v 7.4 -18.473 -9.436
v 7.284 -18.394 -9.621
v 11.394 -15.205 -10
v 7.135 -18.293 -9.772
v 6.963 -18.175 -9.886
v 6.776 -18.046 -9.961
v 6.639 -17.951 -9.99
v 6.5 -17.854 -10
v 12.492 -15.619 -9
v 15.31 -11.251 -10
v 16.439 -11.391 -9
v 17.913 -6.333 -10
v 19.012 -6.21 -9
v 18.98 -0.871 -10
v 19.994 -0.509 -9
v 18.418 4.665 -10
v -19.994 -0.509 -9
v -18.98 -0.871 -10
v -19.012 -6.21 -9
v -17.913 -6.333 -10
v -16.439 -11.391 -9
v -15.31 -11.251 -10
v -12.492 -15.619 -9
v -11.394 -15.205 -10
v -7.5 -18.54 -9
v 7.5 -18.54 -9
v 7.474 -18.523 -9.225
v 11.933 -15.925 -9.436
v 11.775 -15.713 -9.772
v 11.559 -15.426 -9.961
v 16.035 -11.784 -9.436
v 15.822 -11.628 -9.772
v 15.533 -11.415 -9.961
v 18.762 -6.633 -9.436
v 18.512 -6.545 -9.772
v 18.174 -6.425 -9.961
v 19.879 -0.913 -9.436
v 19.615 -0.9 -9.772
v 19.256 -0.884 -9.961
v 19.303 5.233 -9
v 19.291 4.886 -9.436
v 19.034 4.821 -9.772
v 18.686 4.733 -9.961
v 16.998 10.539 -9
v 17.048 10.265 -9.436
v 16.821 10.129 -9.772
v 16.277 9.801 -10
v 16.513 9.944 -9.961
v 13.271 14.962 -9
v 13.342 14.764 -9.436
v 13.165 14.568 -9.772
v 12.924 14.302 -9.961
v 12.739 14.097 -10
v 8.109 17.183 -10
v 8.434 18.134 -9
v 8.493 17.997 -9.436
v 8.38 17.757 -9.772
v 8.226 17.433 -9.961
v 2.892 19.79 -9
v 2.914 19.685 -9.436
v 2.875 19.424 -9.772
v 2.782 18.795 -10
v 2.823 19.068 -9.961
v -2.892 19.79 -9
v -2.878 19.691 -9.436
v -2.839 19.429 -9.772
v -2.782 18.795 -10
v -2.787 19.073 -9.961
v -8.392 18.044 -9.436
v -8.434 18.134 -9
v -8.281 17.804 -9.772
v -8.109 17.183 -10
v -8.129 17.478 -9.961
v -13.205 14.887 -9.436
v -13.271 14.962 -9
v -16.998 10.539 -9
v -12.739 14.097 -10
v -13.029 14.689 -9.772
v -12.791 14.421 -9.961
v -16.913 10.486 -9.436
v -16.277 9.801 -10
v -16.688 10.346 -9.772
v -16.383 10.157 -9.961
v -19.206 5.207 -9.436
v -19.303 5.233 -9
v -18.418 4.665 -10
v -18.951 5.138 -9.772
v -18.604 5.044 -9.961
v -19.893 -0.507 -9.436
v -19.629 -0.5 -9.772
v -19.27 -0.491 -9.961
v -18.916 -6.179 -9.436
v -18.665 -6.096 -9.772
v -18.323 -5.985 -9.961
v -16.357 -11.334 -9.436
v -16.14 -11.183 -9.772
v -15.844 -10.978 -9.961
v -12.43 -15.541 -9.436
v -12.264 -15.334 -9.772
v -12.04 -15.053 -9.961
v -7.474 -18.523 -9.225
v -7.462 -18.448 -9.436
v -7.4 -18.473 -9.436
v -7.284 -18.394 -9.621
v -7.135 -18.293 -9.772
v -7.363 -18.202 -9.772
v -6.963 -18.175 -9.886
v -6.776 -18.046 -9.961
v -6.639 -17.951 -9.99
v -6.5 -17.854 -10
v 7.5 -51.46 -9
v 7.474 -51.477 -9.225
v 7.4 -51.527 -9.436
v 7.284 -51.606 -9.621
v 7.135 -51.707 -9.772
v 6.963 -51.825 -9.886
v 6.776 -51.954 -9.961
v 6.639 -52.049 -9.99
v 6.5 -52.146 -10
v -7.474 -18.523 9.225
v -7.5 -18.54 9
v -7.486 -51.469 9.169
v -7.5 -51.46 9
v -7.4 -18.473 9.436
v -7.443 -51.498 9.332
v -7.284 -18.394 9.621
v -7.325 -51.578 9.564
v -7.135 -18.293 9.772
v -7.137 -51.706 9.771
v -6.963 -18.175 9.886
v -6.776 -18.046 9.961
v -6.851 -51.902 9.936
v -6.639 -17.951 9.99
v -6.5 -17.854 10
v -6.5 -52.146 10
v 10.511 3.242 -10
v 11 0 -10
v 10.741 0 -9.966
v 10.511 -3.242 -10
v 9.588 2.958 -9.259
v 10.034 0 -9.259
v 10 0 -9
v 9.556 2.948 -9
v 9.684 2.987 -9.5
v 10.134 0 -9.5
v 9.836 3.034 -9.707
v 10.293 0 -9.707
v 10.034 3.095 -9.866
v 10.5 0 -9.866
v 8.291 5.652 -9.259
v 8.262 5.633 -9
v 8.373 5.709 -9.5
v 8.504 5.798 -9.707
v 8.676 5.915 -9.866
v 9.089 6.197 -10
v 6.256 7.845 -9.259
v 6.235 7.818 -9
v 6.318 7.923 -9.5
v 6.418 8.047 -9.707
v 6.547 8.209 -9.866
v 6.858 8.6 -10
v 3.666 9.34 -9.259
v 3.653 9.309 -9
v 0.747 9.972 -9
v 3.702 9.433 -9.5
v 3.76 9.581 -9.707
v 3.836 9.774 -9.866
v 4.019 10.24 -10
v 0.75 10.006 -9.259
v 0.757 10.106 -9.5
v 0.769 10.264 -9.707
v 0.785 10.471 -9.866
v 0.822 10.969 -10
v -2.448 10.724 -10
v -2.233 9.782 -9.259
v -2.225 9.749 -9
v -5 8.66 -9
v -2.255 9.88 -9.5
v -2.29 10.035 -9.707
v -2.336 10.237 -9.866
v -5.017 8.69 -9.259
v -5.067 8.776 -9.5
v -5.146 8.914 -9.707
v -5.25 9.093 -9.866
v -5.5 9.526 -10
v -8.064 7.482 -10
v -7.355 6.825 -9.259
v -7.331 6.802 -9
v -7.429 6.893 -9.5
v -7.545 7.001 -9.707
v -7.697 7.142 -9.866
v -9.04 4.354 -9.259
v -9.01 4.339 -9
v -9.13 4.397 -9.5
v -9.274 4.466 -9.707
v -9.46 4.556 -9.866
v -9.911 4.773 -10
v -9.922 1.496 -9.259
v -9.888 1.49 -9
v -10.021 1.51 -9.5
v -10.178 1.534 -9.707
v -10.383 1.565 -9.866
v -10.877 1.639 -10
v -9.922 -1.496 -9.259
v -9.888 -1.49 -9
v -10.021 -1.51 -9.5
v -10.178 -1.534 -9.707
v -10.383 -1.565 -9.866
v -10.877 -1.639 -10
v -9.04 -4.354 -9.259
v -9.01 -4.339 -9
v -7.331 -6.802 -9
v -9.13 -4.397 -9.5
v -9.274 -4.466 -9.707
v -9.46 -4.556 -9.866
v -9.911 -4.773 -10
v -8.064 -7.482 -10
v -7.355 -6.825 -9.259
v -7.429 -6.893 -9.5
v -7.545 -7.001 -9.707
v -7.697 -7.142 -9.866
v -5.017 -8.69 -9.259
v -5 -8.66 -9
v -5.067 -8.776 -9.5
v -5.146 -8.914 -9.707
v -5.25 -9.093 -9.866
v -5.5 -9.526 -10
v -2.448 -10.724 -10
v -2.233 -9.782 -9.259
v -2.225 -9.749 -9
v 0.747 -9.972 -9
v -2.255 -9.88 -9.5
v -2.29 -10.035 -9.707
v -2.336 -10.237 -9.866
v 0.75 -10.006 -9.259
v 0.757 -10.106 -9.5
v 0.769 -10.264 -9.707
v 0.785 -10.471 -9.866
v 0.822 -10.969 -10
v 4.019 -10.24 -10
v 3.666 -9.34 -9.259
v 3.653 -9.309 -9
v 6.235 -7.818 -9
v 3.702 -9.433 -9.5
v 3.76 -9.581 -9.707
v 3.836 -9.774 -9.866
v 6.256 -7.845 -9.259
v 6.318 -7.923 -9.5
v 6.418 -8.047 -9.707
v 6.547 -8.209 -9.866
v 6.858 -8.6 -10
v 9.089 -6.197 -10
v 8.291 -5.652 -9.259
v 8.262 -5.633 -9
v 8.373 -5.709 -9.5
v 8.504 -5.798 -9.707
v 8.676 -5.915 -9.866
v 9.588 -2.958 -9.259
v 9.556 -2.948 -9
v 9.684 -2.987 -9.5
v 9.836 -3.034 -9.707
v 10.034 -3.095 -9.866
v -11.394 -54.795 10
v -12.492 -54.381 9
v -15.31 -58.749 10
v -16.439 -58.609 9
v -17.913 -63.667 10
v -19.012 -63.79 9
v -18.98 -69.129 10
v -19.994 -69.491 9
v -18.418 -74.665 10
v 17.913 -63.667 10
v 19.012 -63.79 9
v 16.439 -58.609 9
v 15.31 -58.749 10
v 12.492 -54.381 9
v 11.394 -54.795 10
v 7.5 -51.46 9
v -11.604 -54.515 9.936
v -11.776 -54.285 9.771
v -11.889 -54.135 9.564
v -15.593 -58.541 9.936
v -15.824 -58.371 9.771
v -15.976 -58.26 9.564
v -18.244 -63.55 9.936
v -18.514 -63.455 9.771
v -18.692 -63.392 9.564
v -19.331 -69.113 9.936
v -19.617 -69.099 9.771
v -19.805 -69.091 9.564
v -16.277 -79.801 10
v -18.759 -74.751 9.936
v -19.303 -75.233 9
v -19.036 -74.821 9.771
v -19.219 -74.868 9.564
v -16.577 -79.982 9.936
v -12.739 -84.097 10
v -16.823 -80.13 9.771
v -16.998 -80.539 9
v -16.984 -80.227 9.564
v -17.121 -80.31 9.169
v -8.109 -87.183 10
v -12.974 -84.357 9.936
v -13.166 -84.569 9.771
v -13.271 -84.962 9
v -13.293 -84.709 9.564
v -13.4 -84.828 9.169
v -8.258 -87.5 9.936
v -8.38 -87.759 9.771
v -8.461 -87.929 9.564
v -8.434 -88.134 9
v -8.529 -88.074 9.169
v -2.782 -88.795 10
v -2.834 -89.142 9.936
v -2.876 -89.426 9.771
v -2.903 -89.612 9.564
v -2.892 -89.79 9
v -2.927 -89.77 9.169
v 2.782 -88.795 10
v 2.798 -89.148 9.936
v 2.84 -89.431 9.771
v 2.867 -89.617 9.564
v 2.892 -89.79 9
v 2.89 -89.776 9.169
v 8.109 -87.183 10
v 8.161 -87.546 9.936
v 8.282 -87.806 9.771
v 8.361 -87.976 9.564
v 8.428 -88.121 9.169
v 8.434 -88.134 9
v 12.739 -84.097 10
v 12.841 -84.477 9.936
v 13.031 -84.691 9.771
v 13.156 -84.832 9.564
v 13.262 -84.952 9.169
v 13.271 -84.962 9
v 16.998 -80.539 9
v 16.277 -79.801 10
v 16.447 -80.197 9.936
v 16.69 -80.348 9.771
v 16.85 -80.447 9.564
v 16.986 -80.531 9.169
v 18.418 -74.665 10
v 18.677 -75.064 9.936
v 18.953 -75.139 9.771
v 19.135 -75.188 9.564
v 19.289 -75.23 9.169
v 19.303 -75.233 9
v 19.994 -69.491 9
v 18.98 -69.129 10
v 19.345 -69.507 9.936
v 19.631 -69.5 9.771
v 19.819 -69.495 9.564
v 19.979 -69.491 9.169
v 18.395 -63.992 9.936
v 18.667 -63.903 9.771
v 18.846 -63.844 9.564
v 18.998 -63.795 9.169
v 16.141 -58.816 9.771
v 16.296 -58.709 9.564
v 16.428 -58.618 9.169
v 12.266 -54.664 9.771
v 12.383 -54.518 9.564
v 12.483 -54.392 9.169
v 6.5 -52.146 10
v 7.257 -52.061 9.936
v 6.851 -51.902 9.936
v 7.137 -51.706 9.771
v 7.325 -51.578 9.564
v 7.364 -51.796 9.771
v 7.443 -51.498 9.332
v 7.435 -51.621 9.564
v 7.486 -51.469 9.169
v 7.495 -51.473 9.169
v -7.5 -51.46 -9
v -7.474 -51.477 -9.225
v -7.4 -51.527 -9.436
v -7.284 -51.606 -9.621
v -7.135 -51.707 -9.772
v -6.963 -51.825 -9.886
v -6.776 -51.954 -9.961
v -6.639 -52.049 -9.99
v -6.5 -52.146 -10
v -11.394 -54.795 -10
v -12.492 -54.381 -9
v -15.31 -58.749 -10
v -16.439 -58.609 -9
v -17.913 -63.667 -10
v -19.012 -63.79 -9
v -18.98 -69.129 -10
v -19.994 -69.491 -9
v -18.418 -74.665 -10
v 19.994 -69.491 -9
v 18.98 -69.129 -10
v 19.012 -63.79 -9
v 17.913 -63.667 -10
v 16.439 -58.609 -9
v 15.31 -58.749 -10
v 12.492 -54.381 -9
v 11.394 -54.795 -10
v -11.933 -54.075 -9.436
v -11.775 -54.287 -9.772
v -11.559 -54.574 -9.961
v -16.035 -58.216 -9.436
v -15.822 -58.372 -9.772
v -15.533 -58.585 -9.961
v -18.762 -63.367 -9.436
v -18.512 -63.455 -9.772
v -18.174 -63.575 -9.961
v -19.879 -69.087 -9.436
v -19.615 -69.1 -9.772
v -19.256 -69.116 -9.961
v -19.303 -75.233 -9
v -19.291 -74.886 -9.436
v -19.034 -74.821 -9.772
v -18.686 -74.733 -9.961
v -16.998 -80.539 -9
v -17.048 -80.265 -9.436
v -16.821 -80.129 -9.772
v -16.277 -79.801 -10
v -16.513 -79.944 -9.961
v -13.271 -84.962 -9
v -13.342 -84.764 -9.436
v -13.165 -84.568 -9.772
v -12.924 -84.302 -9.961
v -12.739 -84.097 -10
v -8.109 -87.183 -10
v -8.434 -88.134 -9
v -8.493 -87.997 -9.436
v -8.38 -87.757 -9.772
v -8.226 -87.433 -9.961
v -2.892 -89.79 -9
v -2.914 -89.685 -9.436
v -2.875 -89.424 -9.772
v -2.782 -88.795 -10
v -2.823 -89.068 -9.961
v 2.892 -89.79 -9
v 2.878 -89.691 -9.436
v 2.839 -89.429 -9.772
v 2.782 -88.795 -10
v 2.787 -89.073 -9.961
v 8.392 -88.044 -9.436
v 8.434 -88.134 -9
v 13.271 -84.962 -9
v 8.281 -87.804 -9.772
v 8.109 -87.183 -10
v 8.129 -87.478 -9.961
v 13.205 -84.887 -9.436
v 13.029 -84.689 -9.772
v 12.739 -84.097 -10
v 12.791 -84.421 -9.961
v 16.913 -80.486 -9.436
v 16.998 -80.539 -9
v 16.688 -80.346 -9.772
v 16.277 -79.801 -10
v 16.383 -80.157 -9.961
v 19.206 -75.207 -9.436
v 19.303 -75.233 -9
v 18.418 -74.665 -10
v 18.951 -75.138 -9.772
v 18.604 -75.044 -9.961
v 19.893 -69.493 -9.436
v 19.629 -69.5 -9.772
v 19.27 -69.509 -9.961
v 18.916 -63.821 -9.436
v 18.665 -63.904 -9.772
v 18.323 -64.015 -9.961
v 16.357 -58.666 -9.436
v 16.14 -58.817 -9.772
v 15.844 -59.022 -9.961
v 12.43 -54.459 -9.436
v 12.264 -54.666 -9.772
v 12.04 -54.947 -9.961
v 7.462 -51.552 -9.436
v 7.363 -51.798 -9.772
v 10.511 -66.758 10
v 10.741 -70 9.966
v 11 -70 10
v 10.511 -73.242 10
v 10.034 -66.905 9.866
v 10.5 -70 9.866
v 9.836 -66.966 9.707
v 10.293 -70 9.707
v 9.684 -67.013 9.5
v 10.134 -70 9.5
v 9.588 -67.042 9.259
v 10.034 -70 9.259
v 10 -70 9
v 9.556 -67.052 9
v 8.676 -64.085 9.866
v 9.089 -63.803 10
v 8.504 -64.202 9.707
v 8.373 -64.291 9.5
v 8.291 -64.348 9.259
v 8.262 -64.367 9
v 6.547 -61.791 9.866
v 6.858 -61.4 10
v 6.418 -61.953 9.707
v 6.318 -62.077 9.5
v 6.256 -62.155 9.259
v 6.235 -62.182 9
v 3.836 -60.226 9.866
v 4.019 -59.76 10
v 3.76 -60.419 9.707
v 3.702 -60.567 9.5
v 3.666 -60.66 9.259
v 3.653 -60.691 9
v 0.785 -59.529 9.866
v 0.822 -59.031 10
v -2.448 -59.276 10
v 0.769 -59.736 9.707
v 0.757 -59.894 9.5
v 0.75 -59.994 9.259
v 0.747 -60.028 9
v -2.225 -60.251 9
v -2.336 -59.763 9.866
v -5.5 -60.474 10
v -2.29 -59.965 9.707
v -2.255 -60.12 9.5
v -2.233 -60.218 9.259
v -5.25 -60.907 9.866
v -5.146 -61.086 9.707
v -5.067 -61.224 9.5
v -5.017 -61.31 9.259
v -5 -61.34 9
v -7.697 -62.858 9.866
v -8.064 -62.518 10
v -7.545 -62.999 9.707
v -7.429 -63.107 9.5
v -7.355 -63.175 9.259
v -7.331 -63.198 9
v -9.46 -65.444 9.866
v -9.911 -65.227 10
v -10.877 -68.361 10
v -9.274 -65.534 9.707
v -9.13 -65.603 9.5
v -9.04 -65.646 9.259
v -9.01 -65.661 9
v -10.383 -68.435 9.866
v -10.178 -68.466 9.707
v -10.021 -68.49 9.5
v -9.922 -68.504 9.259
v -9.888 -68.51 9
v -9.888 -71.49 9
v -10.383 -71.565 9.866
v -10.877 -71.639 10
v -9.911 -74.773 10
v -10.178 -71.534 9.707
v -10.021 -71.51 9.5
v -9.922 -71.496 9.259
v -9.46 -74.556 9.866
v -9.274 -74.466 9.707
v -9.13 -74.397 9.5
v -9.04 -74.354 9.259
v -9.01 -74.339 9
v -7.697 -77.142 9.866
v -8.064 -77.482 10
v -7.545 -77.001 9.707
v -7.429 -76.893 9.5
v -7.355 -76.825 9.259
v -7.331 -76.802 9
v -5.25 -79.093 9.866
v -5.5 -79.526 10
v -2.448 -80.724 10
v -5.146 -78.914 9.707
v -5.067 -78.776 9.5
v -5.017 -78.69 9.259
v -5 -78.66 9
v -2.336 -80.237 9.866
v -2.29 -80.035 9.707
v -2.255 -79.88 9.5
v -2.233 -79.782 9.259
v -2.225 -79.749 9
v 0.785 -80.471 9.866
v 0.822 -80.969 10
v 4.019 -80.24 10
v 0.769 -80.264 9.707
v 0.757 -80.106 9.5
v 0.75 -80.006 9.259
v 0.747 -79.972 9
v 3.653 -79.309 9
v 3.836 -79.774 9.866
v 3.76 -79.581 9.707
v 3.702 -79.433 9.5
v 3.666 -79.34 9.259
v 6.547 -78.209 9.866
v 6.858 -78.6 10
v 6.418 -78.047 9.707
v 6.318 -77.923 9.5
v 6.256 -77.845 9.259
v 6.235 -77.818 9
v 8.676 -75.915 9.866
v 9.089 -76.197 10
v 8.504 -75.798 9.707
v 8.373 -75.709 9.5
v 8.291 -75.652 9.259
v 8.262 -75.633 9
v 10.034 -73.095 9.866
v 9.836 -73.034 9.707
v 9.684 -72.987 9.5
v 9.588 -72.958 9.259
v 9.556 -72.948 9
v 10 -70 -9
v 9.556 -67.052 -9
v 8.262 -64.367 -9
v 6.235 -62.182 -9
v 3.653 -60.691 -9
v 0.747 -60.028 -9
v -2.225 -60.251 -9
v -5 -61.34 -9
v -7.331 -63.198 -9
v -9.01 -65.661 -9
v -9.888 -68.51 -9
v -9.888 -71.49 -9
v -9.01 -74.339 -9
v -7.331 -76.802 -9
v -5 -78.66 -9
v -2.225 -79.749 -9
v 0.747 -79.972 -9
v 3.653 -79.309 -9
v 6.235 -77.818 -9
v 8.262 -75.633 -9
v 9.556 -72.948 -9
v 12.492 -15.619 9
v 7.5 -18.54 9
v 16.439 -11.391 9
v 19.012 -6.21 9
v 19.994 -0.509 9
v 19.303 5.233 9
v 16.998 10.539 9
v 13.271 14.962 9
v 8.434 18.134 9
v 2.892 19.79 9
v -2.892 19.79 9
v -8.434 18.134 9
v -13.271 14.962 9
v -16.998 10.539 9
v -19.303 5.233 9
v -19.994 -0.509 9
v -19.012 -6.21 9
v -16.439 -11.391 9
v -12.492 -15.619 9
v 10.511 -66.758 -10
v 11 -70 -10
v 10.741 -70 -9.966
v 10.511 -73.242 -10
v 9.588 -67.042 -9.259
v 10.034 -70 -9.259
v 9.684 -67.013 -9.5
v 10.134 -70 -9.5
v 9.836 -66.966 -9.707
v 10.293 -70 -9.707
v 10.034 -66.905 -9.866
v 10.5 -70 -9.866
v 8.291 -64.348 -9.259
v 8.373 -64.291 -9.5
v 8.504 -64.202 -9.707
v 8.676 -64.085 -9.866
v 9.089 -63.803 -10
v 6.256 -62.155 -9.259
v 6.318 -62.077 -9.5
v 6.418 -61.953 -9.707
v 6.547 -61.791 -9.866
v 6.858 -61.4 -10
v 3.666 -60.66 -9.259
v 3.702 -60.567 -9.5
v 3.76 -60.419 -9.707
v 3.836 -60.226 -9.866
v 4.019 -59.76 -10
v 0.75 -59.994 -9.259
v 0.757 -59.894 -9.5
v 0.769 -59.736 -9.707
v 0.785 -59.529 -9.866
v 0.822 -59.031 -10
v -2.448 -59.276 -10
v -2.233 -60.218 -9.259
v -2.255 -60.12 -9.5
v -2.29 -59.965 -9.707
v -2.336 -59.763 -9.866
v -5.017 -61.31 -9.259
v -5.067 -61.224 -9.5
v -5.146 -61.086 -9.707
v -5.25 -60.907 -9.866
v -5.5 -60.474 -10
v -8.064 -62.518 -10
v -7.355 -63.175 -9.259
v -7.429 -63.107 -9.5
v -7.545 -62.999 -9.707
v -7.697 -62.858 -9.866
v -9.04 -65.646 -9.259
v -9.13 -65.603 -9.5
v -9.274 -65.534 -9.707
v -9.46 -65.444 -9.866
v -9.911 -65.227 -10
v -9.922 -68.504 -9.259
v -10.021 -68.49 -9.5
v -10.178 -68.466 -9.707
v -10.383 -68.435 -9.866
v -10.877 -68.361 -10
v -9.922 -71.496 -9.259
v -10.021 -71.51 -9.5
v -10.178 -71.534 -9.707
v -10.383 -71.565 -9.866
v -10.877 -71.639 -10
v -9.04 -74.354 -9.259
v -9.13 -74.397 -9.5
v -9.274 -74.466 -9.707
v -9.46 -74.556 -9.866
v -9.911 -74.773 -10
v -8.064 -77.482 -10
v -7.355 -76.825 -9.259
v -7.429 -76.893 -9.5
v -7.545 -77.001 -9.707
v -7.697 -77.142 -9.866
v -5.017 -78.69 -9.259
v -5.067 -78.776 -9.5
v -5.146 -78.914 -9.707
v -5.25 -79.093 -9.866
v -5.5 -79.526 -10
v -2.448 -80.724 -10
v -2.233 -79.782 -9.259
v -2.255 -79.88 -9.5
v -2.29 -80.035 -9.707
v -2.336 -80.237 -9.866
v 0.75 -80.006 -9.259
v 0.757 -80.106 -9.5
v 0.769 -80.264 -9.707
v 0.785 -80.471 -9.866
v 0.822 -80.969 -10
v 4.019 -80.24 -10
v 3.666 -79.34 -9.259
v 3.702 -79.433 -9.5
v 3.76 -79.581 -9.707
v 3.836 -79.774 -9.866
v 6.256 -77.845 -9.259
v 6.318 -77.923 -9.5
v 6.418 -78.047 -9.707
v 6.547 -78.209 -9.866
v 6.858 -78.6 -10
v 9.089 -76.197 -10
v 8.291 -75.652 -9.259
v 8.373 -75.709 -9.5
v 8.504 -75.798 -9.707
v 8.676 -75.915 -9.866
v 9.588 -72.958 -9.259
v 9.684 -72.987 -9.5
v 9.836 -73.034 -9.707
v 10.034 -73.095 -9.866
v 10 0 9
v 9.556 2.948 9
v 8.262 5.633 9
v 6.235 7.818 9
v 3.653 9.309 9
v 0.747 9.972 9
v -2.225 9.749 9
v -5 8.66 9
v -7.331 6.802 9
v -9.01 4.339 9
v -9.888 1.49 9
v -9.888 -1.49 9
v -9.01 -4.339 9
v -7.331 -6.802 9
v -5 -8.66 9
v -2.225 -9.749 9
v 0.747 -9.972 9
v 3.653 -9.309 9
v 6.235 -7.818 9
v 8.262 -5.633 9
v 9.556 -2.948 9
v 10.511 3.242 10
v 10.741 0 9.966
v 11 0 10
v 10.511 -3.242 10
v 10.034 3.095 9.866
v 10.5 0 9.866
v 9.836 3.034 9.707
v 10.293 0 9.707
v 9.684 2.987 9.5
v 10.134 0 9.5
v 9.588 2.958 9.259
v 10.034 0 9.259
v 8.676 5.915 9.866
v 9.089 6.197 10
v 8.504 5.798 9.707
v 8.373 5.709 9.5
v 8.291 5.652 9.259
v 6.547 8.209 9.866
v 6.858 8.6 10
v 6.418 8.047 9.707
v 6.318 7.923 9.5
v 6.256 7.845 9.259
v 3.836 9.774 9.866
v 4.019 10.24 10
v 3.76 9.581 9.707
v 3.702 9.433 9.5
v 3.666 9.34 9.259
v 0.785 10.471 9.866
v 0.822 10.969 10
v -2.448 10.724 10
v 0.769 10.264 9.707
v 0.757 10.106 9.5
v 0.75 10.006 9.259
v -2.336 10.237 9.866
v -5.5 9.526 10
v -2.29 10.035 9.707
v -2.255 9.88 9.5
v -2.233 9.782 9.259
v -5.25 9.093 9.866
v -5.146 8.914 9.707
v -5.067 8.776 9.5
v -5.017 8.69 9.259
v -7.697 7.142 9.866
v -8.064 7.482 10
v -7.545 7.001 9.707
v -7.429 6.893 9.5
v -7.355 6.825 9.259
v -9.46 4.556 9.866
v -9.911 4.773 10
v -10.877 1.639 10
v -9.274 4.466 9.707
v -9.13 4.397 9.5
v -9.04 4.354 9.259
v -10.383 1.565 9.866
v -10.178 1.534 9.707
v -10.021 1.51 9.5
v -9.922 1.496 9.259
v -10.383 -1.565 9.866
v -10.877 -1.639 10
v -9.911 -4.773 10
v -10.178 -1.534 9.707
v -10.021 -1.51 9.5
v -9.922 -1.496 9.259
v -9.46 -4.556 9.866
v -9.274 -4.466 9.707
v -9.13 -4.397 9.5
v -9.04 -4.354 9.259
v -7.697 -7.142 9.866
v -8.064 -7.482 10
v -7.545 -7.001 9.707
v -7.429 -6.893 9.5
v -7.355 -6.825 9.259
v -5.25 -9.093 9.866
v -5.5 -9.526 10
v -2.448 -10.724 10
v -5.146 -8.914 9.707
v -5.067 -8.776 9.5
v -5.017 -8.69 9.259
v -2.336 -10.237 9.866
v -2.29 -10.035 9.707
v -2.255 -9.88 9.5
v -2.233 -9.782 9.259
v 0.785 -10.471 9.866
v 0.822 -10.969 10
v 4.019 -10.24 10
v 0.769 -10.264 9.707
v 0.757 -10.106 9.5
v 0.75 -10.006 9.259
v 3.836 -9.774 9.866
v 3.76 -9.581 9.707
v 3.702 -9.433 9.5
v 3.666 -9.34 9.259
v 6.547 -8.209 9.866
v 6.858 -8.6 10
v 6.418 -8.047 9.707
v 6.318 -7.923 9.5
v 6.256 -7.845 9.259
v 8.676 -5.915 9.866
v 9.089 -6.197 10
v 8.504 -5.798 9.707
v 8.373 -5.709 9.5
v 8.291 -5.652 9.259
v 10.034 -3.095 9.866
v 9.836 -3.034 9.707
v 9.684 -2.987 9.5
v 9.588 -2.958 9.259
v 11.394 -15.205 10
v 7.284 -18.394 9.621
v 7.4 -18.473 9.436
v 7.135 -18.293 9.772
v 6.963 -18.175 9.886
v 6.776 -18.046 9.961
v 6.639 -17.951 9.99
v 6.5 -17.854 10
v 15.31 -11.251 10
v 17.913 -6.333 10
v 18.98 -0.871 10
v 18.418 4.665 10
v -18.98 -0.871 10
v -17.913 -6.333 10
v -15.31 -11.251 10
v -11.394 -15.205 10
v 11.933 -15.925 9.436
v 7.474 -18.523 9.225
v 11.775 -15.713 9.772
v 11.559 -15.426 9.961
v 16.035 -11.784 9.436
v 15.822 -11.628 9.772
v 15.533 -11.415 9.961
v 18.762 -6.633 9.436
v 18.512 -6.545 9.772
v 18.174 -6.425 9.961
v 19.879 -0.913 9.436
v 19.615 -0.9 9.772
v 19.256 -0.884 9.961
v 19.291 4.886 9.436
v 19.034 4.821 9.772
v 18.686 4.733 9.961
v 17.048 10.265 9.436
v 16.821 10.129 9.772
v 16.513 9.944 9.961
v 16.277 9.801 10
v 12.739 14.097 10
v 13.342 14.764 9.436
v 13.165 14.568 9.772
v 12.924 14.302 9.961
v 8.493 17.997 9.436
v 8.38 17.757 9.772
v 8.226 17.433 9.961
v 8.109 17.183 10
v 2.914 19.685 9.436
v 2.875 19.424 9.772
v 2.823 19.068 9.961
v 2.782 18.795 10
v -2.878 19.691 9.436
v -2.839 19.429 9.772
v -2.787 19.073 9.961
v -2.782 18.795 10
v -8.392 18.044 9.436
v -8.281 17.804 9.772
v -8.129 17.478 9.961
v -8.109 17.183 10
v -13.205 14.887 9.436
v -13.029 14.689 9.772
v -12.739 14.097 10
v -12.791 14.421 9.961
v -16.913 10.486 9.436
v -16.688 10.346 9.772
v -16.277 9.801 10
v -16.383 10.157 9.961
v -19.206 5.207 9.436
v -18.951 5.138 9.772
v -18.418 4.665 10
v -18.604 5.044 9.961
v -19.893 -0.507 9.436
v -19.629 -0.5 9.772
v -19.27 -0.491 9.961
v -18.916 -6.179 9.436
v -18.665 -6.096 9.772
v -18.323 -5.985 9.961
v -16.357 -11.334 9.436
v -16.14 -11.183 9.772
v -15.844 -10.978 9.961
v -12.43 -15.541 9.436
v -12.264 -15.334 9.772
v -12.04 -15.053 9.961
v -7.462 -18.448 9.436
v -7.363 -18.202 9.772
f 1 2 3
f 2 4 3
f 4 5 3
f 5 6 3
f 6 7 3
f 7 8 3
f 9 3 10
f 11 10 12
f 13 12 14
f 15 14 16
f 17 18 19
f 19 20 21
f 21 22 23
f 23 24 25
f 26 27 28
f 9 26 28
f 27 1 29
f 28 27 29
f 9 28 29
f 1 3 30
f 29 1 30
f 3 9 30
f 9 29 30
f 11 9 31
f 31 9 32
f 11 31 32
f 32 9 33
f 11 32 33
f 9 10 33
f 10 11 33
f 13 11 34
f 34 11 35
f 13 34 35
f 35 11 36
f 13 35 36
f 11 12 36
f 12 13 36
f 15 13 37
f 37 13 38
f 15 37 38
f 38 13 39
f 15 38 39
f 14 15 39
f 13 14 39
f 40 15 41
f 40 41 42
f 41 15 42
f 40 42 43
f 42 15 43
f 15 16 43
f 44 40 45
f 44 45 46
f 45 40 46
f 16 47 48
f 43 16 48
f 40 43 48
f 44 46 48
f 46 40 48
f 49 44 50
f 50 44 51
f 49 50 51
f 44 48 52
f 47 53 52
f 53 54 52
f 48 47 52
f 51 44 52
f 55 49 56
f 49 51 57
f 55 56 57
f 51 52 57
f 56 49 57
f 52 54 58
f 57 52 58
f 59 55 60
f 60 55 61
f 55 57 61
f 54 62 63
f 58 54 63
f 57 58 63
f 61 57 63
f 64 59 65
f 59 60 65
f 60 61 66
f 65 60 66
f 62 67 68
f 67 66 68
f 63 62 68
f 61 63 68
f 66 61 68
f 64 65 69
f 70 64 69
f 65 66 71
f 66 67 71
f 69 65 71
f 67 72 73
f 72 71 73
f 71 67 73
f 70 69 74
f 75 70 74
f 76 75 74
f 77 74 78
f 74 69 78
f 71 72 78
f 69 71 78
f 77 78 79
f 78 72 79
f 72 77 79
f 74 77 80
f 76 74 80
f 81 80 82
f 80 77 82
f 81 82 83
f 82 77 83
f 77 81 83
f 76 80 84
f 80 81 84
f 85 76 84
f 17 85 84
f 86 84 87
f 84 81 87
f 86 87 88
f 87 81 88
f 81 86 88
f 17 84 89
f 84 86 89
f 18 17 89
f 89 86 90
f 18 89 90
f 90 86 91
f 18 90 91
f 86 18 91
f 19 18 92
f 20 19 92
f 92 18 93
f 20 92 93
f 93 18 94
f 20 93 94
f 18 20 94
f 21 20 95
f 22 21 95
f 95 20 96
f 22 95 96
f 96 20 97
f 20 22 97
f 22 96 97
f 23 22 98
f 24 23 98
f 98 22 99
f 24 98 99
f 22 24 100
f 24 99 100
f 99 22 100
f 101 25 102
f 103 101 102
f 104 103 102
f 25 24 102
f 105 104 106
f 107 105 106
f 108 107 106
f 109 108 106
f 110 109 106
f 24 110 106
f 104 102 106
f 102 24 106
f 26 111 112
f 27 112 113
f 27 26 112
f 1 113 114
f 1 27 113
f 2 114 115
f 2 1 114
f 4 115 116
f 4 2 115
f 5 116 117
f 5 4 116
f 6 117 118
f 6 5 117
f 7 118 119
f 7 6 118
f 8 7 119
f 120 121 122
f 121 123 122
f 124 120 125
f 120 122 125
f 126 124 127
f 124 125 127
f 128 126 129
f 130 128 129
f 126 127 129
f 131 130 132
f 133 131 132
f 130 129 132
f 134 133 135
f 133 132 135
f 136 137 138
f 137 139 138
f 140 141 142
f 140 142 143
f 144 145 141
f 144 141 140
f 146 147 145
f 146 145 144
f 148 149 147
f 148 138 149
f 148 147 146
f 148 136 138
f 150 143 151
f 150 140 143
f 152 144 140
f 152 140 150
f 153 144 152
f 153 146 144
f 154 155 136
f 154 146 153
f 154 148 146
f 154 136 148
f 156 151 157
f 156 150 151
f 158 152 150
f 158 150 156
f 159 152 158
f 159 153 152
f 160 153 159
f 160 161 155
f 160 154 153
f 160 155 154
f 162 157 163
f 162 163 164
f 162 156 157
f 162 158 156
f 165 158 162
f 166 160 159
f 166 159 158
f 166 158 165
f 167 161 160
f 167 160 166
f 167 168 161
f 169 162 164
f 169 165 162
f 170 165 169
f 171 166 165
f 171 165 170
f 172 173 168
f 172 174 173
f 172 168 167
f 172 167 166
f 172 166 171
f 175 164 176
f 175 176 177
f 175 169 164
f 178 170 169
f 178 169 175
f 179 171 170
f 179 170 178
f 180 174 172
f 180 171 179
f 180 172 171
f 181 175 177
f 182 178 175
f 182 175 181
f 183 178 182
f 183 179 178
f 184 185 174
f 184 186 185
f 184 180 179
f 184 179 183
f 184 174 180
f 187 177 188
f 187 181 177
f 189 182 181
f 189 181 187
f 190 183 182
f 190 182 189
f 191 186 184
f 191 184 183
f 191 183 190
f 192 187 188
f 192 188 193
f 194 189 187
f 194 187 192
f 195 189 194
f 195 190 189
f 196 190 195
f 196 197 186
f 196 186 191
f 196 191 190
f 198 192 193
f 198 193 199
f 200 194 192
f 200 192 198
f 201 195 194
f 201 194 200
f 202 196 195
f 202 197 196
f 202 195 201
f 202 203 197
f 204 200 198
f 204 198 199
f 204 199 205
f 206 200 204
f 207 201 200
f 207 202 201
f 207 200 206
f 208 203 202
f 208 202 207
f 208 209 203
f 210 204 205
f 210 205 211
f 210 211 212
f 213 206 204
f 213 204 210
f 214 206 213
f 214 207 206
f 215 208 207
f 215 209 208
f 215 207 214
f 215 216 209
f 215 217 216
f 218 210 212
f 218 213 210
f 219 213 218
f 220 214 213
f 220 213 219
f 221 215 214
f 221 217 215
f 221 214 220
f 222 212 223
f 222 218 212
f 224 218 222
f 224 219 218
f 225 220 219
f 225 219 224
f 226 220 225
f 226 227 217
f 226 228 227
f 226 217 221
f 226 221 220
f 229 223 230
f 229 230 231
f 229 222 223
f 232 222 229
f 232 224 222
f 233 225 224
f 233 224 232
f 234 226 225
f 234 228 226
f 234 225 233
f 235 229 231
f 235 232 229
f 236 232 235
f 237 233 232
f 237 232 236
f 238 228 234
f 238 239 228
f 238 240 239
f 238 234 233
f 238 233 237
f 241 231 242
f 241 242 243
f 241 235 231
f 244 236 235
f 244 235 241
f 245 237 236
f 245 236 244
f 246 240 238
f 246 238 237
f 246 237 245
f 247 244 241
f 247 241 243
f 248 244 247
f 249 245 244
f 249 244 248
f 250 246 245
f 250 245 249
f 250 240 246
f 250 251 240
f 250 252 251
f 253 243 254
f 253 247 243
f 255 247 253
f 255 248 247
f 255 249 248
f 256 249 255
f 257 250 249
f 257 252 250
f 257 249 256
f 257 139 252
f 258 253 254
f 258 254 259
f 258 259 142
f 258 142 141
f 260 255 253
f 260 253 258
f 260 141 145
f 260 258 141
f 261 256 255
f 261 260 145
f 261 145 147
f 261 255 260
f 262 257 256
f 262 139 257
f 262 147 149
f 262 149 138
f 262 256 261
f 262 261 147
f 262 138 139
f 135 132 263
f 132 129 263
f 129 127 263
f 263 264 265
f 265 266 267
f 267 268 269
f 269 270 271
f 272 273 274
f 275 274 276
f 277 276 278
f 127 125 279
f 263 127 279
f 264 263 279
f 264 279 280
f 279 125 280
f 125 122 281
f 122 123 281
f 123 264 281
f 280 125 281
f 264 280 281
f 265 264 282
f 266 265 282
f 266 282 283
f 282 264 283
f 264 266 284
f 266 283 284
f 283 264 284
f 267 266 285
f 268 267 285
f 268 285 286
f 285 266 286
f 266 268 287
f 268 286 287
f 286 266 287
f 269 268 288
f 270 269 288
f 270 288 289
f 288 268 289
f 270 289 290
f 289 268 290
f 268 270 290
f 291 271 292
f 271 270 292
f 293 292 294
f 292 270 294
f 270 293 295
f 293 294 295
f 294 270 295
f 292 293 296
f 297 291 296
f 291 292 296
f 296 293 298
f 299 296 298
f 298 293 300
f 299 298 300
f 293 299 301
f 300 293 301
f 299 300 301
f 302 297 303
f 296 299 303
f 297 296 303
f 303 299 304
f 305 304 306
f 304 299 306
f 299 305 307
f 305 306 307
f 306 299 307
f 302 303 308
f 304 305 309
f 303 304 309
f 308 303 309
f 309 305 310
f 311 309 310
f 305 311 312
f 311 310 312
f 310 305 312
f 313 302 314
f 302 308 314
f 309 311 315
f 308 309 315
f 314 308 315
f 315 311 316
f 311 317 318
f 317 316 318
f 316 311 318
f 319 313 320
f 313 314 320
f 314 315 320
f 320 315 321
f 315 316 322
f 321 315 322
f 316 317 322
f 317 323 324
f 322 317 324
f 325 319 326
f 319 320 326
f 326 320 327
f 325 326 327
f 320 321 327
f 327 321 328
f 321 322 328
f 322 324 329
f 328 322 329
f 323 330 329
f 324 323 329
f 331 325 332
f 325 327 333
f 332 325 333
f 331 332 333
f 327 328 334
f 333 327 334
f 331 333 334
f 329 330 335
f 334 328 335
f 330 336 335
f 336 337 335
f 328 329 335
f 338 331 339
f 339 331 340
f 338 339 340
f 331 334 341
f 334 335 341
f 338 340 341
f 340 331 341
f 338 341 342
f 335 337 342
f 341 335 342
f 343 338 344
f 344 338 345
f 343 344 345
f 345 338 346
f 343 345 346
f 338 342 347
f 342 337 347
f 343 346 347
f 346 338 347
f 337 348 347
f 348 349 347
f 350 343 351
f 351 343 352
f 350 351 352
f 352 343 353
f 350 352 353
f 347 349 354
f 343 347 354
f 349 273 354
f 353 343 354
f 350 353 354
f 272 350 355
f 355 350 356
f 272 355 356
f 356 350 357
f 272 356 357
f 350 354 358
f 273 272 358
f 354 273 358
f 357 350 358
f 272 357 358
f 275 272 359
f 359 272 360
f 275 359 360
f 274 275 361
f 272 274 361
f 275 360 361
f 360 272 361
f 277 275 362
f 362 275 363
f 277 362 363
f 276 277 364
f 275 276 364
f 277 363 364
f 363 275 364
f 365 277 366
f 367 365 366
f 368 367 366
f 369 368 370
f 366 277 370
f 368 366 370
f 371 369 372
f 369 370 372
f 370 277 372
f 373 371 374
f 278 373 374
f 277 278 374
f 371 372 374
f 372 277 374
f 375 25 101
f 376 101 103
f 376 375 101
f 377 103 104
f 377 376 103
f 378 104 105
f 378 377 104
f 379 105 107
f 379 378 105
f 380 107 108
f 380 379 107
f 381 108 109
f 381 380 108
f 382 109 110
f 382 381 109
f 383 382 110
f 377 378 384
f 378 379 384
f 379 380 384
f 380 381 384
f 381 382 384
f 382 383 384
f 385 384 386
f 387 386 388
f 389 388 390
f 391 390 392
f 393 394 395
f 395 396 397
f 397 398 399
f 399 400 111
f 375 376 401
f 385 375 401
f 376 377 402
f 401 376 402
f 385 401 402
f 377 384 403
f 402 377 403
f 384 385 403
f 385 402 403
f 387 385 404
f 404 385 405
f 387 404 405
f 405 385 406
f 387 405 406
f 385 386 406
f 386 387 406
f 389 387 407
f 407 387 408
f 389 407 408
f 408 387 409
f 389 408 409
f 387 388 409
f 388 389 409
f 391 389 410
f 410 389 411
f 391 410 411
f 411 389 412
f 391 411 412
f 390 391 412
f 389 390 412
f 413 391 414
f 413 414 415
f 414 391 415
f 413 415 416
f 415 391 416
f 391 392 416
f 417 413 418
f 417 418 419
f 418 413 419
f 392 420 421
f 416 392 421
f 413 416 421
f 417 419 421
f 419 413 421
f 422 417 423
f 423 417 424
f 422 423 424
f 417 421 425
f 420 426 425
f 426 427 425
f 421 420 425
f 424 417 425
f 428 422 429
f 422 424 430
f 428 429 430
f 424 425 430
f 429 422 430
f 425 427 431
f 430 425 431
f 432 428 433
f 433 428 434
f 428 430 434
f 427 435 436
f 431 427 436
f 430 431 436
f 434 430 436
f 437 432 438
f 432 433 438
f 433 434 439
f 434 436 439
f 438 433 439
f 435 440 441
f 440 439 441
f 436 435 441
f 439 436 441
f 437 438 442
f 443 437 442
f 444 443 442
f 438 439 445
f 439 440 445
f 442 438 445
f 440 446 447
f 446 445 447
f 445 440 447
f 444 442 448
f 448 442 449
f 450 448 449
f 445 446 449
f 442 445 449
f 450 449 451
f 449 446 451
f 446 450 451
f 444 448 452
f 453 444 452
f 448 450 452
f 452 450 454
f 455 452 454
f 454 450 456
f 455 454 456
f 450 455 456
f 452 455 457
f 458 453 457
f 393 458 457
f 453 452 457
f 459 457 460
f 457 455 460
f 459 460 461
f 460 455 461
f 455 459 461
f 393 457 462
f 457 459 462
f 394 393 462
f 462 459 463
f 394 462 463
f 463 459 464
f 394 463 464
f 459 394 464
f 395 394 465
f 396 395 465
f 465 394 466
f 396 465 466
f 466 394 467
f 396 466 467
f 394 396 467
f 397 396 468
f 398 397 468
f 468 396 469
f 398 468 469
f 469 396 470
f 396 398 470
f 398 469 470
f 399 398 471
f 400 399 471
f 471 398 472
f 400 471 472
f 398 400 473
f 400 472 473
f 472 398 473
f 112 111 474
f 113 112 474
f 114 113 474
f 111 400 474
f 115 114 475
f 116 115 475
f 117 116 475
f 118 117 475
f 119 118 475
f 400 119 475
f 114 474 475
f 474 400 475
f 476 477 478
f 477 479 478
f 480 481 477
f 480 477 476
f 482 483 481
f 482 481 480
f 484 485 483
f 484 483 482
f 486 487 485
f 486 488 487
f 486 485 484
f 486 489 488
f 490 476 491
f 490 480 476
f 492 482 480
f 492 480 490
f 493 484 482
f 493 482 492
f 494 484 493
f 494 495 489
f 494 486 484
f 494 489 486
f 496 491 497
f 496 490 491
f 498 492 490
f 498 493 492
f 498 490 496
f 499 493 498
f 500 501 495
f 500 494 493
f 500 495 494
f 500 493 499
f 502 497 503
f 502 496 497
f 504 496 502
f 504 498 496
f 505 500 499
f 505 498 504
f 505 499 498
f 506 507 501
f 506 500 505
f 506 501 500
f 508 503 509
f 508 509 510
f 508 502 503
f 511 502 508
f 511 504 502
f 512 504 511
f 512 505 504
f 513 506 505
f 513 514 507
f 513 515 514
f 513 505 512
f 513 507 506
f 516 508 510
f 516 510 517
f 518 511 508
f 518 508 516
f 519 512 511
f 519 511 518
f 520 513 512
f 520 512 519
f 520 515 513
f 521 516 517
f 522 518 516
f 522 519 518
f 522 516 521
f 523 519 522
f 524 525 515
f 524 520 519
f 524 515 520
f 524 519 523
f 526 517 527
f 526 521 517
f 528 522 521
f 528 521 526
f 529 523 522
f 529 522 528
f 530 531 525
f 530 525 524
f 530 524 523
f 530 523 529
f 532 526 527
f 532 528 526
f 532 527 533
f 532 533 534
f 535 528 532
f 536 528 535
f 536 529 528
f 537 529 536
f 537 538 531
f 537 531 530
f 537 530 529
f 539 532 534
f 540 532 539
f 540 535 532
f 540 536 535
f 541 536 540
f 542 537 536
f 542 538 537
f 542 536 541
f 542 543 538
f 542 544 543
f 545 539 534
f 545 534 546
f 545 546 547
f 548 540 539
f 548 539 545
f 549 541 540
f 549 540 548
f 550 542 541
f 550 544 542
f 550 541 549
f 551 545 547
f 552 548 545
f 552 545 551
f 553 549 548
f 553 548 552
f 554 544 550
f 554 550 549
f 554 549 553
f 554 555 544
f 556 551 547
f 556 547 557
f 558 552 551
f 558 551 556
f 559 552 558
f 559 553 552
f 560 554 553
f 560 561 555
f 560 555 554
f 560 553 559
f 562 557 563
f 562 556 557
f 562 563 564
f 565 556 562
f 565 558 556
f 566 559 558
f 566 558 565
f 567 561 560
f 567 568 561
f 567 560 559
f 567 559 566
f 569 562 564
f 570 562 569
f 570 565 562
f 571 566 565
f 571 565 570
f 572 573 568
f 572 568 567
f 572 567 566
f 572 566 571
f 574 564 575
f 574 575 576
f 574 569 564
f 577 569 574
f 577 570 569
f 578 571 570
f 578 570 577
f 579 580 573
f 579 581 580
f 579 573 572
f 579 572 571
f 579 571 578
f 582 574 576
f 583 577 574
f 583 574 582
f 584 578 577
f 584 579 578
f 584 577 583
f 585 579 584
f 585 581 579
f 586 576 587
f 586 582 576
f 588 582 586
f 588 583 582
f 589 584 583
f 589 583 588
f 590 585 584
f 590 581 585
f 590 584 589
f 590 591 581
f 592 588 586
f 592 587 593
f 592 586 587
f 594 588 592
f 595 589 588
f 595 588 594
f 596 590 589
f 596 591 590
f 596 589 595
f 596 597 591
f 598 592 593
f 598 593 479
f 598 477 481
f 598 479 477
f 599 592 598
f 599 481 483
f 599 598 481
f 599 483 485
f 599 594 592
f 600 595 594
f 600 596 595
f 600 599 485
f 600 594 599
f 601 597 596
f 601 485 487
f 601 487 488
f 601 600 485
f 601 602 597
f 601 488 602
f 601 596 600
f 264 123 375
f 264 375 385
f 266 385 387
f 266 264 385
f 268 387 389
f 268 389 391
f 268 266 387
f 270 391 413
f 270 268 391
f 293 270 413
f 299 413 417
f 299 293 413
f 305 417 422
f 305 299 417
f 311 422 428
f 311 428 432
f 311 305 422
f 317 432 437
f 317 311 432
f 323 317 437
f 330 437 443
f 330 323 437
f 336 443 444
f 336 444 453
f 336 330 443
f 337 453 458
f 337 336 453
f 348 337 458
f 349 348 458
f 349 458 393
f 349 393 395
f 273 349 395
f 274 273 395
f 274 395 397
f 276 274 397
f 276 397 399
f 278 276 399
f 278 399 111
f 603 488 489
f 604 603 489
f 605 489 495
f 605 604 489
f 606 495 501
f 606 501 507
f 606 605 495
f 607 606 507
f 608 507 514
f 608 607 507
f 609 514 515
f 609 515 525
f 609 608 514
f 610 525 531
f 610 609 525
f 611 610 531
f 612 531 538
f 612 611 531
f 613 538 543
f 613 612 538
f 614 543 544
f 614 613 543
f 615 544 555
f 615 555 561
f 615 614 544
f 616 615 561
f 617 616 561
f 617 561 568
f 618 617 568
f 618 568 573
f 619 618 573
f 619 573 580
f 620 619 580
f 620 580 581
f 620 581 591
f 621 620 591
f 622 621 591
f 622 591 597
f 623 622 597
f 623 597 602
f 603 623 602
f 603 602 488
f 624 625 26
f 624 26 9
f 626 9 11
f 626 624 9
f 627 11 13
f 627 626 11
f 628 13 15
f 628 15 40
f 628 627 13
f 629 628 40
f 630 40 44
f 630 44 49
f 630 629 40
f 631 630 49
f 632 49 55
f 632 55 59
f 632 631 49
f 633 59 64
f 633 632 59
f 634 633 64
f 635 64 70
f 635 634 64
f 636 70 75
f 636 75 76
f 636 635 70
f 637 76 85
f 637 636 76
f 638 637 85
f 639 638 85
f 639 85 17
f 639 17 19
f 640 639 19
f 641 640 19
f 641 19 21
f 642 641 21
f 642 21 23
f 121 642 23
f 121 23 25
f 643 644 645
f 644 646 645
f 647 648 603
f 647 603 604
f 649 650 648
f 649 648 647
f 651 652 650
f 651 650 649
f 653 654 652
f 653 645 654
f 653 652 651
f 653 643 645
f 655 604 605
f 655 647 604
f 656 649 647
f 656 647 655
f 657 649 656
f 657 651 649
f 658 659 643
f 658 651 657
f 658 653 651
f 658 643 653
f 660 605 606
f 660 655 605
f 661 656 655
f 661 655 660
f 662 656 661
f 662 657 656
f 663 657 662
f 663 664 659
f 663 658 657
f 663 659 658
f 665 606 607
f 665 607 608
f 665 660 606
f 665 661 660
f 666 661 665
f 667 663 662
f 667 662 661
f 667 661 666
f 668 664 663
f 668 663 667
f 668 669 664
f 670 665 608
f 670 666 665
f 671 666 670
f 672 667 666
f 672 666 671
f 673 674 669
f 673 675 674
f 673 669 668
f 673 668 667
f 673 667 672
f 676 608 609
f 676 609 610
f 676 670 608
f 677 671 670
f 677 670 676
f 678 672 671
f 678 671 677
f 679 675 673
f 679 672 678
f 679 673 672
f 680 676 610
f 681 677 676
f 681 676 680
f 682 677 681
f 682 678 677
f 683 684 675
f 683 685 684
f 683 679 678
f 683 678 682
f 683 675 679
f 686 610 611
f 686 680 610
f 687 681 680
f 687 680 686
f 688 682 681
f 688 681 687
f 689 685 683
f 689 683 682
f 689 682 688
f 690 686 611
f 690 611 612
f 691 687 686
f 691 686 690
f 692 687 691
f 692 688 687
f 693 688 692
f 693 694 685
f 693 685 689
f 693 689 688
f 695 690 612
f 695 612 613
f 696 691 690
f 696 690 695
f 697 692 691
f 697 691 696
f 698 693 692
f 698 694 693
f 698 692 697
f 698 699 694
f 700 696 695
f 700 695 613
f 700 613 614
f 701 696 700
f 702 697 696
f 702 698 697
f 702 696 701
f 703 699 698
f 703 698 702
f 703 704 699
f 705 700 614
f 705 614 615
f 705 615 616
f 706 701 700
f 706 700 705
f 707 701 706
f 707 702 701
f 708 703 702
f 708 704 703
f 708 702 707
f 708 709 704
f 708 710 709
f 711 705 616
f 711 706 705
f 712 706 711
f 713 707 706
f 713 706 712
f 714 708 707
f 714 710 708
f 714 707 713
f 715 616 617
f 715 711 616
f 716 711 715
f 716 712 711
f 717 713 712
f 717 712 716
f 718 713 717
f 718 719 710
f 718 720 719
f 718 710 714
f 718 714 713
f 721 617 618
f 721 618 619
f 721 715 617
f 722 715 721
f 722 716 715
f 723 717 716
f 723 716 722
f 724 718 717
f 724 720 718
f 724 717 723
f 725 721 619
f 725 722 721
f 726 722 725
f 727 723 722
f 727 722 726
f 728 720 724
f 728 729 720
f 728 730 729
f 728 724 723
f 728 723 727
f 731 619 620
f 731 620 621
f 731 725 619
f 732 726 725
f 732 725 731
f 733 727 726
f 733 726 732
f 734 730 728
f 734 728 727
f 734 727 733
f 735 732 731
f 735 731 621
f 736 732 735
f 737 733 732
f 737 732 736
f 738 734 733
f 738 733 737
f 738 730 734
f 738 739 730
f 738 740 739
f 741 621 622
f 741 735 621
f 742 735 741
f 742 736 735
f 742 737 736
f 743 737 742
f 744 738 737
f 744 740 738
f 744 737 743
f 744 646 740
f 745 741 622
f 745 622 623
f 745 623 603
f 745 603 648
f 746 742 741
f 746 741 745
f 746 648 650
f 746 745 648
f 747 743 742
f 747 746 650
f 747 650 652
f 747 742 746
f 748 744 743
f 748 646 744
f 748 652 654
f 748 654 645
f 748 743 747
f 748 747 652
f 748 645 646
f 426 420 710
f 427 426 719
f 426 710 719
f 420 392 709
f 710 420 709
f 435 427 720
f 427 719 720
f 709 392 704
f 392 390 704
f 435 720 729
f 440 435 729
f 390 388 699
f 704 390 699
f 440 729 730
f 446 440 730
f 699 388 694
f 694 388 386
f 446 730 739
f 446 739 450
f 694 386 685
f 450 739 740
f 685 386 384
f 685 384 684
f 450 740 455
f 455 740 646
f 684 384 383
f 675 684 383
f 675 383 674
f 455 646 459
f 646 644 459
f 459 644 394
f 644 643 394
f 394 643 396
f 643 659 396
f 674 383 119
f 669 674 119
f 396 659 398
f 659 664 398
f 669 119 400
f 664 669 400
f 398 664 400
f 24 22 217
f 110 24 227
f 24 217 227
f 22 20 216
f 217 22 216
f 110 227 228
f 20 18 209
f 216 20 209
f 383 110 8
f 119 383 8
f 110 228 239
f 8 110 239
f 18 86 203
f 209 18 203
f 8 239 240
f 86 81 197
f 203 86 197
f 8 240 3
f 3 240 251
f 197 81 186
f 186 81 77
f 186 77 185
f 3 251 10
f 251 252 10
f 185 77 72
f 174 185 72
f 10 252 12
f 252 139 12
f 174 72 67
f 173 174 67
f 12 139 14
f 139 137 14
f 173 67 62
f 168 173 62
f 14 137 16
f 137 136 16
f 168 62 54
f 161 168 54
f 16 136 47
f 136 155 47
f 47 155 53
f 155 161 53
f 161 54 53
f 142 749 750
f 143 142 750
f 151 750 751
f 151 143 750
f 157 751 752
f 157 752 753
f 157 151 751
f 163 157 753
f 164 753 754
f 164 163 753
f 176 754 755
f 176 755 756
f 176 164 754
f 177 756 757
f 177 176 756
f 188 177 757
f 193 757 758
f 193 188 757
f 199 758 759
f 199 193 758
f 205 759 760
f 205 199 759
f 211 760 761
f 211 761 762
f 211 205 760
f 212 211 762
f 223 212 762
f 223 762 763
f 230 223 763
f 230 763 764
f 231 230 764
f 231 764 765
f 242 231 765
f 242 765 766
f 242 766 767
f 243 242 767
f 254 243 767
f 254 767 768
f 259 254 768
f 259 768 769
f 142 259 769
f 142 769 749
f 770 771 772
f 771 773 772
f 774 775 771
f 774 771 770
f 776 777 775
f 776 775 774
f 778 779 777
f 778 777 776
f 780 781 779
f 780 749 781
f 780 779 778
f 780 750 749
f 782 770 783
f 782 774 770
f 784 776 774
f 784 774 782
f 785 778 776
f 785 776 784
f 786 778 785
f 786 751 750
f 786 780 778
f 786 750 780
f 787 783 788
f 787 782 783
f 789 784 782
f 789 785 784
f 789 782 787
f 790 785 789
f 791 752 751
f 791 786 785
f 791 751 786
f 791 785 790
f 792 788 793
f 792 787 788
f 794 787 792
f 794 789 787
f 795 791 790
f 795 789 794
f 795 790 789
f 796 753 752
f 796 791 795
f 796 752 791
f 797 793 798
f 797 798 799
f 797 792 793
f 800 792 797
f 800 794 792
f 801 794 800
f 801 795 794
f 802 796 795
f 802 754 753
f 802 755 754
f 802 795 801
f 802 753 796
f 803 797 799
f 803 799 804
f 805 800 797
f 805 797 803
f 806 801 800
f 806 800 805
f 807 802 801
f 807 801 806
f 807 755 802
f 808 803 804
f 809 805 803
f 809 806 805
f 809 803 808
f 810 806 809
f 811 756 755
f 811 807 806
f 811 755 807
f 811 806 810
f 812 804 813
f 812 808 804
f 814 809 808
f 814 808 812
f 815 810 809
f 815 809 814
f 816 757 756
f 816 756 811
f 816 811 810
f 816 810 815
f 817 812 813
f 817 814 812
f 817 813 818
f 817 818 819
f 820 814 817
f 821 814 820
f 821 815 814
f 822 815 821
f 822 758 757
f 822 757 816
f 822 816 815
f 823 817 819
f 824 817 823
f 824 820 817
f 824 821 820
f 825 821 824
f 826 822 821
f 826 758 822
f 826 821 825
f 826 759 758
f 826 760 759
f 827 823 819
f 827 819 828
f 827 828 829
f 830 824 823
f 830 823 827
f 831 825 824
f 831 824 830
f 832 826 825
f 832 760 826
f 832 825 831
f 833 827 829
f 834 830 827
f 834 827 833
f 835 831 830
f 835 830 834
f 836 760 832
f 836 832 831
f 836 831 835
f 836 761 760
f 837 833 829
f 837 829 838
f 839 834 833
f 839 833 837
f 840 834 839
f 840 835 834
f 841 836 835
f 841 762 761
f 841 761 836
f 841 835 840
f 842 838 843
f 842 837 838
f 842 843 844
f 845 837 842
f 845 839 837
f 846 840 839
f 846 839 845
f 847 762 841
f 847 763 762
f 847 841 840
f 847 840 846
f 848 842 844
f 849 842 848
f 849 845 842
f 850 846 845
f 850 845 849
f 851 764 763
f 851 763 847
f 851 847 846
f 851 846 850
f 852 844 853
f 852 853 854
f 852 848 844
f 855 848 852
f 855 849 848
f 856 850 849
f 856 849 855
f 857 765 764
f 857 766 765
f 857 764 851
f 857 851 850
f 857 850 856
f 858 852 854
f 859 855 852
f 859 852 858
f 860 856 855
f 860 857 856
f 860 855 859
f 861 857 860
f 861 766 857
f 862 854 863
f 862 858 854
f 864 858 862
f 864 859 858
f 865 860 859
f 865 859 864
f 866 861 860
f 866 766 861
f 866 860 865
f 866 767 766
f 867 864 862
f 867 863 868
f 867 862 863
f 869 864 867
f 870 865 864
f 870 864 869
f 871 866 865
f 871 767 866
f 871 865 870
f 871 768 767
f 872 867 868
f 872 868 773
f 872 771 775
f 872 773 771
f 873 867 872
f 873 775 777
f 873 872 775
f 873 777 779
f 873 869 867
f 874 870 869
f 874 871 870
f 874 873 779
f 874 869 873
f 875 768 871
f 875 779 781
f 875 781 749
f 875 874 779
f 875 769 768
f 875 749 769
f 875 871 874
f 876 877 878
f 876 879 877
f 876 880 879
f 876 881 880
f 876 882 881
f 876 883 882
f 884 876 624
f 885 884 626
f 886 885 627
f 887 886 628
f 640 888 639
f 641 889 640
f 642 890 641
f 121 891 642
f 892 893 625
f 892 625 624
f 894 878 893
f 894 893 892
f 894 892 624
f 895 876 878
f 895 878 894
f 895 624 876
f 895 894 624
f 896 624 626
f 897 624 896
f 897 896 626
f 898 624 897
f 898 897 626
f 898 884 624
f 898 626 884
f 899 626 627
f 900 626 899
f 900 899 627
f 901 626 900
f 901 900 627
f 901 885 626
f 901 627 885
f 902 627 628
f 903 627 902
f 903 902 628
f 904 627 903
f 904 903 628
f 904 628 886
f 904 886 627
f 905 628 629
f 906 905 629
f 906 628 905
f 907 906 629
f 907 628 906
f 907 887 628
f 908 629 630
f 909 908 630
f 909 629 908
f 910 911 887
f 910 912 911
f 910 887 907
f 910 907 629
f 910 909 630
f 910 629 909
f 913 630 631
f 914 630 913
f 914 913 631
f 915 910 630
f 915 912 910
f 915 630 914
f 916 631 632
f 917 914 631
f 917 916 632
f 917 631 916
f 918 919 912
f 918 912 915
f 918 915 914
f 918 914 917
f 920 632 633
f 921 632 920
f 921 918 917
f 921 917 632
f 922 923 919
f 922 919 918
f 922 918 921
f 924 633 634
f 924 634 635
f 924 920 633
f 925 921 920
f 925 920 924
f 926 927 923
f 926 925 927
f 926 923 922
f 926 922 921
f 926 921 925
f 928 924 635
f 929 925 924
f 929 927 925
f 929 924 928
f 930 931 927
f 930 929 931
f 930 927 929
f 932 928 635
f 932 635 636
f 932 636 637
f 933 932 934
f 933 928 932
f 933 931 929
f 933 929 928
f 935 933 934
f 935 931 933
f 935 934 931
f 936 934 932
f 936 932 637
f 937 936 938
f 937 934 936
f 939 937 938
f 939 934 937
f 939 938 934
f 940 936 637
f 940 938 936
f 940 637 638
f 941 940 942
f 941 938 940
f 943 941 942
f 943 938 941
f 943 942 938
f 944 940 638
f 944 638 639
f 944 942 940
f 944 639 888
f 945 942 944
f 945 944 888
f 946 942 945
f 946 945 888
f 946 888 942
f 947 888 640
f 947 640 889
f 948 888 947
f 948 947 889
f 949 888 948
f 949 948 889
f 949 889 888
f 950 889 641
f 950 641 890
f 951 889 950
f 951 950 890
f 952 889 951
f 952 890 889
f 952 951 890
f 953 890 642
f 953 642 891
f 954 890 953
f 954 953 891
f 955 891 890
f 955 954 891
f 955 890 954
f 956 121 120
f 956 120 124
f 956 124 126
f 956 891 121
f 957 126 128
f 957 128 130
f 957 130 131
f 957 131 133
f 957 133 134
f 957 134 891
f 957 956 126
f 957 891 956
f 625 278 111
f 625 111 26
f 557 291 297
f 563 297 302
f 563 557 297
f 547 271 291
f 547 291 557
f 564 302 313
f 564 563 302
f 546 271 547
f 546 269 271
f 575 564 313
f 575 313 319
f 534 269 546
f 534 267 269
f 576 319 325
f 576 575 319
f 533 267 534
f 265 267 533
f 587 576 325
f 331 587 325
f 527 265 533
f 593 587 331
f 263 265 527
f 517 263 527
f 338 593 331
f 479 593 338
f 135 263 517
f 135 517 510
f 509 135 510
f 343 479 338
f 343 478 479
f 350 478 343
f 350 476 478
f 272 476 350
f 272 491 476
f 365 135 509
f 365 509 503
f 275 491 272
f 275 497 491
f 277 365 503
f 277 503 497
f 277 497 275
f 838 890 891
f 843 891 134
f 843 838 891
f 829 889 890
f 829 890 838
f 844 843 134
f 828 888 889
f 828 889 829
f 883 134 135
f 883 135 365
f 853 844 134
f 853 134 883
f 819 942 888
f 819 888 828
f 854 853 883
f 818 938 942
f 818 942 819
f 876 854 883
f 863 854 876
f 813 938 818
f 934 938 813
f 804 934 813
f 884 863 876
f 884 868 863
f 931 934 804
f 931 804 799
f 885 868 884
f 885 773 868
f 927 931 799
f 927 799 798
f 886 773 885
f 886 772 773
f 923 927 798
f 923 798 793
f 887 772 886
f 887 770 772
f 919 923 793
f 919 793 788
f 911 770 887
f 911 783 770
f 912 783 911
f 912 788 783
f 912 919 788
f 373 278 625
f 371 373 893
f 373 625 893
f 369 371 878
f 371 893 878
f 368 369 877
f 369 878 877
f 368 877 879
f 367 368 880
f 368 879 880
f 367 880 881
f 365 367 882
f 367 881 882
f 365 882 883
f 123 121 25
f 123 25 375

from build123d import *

# Parameters (mm, degrees)
SKETCH1_R           = 10
BOSS_EXTRUDE1_DEPTH = 10
FILLET1_R           = 1


with BuildPart() as part:
    # Sketch1 → Boss-Extrude1 (new body, symmetric)
    with BuildSketch(Plane.XY):
        with BuildLine():
            Line((-7.5, -18.540496218), (-7.5, -51.459503782))
            ThreePointArc((-7.5, -51.459503782), (0, -90), (7.5, -51.459503782))
            Line((7.5, -51.459503782), (7.5, -18.540496218))
            ThreePointArc((7.5, -18.540496218), (0, 20), (-7.5, -18.540496218))
        make_face()
        Circle(SKETCH1_R, mode=Mode.SUBTRACT)
        with Locations((0, -70)):
            Circle(SKETCH1_R, mode=Mode.SUBTRACT)
    extrude(amount=BOSS_EXTRUDE1_DEPTH, both=True)

    # Fillet1
    fillet1_edges = [part.edges().sort_by_distance(p)[0] for p in [
        (-10, 0, -10),
        (-10, 0, 10),
        (0, -90, 10),
        (-10, -70, -10),
        (-10, -70, 10),
        (7.5, -35, 10),
        (0, 20, 10),
        (7.5, -35, -10),
        (0, -90, -10),
        (-7.5, -35, -10),
        (0, 20, -10),
        (-7.5, -35, 10),
    ]]
    fillet(fillet1_edges, radius=FILLET1_R)


solid = part.part
